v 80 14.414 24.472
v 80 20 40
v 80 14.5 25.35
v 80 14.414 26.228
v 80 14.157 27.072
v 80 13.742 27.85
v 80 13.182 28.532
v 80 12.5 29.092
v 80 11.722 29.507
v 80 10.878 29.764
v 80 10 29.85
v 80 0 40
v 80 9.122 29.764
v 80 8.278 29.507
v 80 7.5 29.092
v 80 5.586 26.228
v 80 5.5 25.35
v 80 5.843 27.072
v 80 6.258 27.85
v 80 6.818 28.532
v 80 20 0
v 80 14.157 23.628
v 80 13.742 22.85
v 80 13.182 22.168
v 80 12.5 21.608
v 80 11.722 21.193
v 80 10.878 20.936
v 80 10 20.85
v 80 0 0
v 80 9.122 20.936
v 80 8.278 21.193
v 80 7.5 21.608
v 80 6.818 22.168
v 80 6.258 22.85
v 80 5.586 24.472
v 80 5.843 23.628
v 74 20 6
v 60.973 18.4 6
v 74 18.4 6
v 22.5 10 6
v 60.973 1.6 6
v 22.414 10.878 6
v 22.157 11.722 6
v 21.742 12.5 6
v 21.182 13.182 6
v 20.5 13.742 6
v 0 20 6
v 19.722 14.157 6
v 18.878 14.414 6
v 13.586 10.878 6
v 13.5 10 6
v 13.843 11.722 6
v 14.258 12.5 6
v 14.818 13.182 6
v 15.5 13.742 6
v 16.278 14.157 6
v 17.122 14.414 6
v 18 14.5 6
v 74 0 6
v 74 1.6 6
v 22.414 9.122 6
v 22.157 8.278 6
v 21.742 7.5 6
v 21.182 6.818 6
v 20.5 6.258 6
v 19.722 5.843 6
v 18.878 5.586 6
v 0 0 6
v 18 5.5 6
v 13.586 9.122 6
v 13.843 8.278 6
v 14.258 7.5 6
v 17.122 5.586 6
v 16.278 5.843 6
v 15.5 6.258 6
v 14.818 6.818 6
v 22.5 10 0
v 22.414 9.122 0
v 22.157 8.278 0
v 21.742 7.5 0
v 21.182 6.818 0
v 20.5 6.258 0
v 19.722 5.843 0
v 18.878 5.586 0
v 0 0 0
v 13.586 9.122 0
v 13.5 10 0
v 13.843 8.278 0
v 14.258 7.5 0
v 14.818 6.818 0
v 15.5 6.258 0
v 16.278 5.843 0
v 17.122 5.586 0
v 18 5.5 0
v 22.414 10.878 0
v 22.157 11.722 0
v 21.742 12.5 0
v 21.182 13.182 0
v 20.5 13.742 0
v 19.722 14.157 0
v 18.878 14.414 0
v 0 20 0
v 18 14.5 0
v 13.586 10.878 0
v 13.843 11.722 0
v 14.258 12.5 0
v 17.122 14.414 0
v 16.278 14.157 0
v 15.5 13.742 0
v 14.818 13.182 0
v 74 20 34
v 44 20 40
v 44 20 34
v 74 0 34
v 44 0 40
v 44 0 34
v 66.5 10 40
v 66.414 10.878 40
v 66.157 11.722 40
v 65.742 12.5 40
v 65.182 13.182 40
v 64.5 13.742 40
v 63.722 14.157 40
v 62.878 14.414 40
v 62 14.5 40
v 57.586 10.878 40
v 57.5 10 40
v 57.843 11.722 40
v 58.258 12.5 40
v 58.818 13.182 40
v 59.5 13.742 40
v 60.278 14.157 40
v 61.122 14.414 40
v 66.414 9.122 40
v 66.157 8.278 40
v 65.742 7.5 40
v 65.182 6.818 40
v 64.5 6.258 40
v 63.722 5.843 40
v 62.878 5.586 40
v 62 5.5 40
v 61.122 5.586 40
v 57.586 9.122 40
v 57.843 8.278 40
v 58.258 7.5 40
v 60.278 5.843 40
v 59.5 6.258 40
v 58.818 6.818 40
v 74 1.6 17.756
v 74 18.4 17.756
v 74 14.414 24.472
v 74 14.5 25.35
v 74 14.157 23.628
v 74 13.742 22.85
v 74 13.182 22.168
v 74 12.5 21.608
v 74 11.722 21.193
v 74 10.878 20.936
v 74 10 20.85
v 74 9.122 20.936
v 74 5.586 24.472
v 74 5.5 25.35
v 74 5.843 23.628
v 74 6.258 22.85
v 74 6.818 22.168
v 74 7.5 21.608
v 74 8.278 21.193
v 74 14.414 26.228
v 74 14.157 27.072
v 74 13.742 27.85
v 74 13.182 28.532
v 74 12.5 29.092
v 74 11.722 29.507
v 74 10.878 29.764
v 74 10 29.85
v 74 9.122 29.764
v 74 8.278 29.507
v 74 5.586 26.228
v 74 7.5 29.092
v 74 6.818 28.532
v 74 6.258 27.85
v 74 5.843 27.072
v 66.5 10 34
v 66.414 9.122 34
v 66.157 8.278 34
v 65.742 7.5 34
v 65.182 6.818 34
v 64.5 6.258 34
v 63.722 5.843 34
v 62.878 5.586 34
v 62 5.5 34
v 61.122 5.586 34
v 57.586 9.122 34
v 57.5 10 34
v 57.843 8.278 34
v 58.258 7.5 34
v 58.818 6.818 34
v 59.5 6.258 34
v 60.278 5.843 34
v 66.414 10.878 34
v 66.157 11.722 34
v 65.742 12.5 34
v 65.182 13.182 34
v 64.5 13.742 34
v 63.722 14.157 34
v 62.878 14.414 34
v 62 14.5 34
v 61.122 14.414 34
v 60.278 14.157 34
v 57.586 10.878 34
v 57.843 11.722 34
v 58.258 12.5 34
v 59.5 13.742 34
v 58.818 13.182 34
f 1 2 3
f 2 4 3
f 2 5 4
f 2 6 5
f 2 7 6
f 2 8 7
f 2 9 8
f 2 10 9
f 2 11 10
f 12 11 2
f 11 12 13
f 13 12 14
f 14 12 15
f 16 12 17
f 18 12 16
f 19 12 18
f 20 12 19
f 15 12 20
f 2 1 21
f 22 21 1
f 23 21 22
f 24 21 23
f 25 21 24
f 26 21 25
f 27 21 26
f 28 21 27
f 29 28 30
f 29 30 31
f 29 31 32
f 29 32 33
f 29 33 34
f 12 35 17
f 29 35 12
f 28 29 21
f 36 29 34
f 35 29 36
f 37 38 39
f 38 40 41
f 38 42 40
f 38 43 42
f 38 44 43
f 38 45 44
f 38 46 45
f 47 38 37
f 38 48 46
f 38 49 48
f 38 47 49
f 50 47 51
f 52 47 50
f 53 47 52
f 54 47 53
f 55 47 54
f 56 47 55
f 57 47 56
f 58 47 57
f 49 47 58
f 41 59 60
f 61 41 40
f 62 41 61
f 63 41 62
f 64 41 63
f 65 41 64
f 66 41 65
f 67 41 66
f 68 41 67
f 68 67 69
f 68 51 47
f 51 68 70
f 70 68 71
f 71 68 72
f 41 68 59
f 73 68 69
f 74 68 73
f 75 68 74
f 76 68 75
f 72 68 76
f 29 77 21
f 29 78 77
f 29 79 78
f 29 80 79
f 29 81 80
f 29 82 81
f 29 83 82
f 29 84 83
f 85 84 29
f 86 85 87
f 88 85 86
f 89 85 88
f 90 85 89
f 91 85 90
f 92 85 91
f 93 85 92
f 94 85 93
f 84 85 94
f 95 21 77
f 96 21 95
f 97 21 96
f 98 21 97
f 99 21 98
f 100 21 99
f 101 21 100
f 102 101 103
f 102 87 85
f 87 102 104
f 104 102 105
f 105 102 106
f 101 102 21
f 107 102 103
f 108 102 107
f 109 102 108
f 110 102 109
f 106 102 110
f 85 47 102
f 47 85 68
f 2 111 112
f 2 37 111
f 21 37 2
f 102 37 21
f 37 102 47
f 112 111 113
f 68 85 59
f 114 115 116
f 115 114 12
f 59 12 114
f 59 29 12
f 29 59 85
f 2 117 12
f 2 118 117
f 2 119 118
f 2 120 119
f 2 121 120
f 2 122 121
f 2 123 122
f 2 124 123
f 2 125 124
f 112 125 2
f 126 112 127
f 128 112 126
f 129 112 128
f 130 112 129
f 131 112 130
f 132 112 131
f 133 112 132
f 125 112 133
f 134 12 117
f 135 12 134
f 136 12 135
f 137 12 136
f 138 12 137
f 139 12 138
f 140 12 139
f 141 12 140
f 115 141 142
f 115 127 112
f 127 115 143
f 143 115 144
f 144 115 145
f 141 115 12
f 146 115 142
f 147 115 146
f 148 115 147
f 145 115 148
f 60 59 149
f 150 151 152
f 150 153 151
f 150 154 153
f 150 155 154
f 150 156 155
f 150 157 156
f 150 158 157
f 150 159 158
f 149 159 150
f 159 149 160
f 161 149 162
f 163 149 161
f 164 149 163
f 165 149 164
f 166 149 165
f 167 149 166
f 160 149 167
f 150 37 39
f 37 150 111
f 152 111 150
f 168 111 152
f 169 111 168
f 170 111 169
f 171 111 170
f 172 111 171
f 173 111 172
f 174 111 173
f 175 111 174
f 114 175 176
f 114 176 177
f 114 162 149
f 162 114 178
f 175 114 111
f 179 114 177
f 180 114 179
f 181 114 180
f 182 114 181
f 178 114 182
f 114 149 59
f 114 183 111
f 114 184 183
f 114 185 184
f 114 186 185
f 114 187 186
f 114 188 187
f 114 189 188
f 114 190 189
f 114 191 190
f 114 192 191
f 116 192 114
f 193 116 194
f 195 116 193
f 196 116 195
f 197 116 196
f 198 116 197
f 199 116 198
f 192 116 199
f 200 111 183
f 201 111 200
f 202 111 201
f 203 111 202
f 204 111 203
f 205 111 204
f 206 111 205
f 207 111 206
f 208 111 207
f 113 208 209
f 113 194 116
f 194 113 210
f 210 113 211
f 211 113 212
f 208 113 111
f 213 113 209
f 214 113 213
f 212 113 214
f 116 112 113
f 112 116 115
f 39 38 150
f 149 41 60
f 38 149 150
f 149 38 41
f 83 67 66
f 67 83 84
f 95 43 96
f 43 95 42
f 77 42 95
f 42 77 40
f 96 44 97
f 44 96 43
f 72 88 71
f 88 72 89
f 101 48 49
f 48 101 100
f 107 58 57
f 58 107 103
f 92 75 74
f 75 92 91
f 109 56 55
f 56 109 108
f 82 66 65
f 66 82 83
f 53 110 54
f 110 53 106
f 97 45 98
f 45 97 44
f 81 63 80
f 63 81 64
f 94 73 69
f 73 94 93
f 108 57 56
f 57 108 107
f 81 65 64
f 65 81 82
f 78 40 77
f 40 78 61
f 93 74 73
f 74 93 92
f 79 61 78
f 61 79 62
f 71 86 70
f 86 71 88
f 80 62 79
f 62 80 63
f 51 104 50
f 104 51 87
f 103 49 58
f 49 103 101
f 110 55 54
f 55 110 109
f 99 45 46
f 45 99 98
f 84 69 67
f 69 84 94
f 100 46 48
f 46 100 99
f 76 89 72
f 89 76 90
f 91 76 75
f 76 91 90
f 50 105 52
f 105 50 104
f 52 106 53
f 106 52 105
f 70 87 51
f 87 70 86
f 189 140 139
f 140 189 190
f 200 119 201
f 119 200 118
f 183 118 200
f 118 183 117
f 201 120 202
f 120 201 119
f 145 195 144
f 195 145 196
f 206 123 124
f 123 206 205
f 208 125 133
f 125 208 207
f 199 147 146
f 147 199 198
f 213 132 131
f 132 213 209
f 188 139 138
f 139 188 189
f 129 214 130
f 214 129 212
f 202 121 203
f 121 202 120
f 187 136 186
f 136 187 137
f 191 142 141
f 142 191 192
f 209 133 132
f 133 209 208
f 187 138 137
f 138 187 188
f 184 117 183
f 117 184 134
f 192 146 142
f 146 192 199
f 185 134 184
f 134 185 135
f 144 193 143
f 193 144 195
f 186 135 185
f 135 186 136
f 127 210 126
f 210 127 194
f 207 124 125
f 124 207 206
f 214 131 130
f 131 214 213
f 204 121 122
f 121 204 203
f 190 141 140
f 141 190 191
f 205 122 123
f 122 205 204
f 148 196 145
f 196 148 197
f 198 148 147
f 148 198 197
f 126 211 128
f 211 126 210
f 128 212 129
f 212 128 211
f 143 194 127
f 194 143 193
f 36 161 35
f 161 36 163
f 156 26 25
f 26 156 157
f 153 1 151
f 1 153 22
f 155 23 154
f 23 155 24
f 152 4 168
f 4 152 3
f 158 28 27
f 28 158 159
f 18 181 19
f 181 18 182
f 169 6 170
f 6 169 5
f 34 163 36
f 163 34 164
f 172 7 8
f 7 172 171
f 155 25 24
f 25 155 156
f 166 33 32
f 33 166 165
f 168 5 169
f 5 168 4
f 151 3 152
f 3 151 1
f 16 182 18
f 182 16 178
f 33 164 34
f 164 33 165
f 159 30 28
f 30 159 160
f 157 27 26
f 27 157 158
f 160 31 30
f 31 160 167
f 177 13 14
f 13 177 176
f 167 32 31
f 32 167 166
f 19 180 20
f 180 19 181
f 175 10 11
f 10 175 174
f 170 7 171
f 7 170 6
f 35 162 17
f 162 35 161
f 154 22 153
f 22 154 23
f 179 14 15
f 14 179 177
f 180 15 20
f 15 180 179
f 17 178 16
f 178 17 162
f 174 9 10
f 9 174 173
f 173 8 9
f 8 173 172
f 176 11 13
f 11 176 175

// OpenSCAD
$fn = 32;

// ----------------------------------------------------------------------
// Z-bracket: 80 x 20 x 40 mm
// ----------------------------------------------------------------------

// --- parameters (mm) ---
lower_len = 80;           // lower foot length, X
upper_len = 30;           // upper foot length, X
width = 20;               // bracket width, Y
rise = 40;                // overall rise, Z
thick = 6;                // plate thickness
hole_d = 9;               // clearance for M8
rib_len = 14.8;           // gusset leg
rib_sink = 1.6;           // gusset overlap into the plates

module hole_z(px, py, z0) {
  translate([px, py, z0 - 2.5]) cylinder(h = thick + 5, d = hole_d);
}
module hole_x(py, pz) {
  translate([-2.5, py, pz]) rotate([0, 90, 0]) cylinder(h = thick + 5, d = hole_d);
}
module gusset(x0) {
  translate([x0, width - rib_sink, 0])
    rotate([90, 0, 0])
      linear_extrude(height = width - 2 * rib_sink)
        polygon(points = [[rib_sink, thick - rib_sink],
                          [rib_sink, thick - rib_sink + rib_len],
                          [-rib_len, thick - rib_sink]]);
}

difference() {
  union() {
    cube([lower_len, width, thick]);
    /* web, overlapping the lower foot */
    translate([lower_len - thick, 0, 0]) cube([thick, width, rise]);
    /* upper foot, sunk into the web */
    translate([lower_len - thick - upper_len, 0, rise - thick]) cube([upper_len + thick, width, thick]);
    gusset(lower_len - thick);
  }
  hole_z(18, 10, 0);
  translate([lower_len - thick - 12, 0, 0]) hole_z(0, 10, rise - thick);
  translate([lower_len - thick, 0, 0]) hole_x(10, 25.35);
}
